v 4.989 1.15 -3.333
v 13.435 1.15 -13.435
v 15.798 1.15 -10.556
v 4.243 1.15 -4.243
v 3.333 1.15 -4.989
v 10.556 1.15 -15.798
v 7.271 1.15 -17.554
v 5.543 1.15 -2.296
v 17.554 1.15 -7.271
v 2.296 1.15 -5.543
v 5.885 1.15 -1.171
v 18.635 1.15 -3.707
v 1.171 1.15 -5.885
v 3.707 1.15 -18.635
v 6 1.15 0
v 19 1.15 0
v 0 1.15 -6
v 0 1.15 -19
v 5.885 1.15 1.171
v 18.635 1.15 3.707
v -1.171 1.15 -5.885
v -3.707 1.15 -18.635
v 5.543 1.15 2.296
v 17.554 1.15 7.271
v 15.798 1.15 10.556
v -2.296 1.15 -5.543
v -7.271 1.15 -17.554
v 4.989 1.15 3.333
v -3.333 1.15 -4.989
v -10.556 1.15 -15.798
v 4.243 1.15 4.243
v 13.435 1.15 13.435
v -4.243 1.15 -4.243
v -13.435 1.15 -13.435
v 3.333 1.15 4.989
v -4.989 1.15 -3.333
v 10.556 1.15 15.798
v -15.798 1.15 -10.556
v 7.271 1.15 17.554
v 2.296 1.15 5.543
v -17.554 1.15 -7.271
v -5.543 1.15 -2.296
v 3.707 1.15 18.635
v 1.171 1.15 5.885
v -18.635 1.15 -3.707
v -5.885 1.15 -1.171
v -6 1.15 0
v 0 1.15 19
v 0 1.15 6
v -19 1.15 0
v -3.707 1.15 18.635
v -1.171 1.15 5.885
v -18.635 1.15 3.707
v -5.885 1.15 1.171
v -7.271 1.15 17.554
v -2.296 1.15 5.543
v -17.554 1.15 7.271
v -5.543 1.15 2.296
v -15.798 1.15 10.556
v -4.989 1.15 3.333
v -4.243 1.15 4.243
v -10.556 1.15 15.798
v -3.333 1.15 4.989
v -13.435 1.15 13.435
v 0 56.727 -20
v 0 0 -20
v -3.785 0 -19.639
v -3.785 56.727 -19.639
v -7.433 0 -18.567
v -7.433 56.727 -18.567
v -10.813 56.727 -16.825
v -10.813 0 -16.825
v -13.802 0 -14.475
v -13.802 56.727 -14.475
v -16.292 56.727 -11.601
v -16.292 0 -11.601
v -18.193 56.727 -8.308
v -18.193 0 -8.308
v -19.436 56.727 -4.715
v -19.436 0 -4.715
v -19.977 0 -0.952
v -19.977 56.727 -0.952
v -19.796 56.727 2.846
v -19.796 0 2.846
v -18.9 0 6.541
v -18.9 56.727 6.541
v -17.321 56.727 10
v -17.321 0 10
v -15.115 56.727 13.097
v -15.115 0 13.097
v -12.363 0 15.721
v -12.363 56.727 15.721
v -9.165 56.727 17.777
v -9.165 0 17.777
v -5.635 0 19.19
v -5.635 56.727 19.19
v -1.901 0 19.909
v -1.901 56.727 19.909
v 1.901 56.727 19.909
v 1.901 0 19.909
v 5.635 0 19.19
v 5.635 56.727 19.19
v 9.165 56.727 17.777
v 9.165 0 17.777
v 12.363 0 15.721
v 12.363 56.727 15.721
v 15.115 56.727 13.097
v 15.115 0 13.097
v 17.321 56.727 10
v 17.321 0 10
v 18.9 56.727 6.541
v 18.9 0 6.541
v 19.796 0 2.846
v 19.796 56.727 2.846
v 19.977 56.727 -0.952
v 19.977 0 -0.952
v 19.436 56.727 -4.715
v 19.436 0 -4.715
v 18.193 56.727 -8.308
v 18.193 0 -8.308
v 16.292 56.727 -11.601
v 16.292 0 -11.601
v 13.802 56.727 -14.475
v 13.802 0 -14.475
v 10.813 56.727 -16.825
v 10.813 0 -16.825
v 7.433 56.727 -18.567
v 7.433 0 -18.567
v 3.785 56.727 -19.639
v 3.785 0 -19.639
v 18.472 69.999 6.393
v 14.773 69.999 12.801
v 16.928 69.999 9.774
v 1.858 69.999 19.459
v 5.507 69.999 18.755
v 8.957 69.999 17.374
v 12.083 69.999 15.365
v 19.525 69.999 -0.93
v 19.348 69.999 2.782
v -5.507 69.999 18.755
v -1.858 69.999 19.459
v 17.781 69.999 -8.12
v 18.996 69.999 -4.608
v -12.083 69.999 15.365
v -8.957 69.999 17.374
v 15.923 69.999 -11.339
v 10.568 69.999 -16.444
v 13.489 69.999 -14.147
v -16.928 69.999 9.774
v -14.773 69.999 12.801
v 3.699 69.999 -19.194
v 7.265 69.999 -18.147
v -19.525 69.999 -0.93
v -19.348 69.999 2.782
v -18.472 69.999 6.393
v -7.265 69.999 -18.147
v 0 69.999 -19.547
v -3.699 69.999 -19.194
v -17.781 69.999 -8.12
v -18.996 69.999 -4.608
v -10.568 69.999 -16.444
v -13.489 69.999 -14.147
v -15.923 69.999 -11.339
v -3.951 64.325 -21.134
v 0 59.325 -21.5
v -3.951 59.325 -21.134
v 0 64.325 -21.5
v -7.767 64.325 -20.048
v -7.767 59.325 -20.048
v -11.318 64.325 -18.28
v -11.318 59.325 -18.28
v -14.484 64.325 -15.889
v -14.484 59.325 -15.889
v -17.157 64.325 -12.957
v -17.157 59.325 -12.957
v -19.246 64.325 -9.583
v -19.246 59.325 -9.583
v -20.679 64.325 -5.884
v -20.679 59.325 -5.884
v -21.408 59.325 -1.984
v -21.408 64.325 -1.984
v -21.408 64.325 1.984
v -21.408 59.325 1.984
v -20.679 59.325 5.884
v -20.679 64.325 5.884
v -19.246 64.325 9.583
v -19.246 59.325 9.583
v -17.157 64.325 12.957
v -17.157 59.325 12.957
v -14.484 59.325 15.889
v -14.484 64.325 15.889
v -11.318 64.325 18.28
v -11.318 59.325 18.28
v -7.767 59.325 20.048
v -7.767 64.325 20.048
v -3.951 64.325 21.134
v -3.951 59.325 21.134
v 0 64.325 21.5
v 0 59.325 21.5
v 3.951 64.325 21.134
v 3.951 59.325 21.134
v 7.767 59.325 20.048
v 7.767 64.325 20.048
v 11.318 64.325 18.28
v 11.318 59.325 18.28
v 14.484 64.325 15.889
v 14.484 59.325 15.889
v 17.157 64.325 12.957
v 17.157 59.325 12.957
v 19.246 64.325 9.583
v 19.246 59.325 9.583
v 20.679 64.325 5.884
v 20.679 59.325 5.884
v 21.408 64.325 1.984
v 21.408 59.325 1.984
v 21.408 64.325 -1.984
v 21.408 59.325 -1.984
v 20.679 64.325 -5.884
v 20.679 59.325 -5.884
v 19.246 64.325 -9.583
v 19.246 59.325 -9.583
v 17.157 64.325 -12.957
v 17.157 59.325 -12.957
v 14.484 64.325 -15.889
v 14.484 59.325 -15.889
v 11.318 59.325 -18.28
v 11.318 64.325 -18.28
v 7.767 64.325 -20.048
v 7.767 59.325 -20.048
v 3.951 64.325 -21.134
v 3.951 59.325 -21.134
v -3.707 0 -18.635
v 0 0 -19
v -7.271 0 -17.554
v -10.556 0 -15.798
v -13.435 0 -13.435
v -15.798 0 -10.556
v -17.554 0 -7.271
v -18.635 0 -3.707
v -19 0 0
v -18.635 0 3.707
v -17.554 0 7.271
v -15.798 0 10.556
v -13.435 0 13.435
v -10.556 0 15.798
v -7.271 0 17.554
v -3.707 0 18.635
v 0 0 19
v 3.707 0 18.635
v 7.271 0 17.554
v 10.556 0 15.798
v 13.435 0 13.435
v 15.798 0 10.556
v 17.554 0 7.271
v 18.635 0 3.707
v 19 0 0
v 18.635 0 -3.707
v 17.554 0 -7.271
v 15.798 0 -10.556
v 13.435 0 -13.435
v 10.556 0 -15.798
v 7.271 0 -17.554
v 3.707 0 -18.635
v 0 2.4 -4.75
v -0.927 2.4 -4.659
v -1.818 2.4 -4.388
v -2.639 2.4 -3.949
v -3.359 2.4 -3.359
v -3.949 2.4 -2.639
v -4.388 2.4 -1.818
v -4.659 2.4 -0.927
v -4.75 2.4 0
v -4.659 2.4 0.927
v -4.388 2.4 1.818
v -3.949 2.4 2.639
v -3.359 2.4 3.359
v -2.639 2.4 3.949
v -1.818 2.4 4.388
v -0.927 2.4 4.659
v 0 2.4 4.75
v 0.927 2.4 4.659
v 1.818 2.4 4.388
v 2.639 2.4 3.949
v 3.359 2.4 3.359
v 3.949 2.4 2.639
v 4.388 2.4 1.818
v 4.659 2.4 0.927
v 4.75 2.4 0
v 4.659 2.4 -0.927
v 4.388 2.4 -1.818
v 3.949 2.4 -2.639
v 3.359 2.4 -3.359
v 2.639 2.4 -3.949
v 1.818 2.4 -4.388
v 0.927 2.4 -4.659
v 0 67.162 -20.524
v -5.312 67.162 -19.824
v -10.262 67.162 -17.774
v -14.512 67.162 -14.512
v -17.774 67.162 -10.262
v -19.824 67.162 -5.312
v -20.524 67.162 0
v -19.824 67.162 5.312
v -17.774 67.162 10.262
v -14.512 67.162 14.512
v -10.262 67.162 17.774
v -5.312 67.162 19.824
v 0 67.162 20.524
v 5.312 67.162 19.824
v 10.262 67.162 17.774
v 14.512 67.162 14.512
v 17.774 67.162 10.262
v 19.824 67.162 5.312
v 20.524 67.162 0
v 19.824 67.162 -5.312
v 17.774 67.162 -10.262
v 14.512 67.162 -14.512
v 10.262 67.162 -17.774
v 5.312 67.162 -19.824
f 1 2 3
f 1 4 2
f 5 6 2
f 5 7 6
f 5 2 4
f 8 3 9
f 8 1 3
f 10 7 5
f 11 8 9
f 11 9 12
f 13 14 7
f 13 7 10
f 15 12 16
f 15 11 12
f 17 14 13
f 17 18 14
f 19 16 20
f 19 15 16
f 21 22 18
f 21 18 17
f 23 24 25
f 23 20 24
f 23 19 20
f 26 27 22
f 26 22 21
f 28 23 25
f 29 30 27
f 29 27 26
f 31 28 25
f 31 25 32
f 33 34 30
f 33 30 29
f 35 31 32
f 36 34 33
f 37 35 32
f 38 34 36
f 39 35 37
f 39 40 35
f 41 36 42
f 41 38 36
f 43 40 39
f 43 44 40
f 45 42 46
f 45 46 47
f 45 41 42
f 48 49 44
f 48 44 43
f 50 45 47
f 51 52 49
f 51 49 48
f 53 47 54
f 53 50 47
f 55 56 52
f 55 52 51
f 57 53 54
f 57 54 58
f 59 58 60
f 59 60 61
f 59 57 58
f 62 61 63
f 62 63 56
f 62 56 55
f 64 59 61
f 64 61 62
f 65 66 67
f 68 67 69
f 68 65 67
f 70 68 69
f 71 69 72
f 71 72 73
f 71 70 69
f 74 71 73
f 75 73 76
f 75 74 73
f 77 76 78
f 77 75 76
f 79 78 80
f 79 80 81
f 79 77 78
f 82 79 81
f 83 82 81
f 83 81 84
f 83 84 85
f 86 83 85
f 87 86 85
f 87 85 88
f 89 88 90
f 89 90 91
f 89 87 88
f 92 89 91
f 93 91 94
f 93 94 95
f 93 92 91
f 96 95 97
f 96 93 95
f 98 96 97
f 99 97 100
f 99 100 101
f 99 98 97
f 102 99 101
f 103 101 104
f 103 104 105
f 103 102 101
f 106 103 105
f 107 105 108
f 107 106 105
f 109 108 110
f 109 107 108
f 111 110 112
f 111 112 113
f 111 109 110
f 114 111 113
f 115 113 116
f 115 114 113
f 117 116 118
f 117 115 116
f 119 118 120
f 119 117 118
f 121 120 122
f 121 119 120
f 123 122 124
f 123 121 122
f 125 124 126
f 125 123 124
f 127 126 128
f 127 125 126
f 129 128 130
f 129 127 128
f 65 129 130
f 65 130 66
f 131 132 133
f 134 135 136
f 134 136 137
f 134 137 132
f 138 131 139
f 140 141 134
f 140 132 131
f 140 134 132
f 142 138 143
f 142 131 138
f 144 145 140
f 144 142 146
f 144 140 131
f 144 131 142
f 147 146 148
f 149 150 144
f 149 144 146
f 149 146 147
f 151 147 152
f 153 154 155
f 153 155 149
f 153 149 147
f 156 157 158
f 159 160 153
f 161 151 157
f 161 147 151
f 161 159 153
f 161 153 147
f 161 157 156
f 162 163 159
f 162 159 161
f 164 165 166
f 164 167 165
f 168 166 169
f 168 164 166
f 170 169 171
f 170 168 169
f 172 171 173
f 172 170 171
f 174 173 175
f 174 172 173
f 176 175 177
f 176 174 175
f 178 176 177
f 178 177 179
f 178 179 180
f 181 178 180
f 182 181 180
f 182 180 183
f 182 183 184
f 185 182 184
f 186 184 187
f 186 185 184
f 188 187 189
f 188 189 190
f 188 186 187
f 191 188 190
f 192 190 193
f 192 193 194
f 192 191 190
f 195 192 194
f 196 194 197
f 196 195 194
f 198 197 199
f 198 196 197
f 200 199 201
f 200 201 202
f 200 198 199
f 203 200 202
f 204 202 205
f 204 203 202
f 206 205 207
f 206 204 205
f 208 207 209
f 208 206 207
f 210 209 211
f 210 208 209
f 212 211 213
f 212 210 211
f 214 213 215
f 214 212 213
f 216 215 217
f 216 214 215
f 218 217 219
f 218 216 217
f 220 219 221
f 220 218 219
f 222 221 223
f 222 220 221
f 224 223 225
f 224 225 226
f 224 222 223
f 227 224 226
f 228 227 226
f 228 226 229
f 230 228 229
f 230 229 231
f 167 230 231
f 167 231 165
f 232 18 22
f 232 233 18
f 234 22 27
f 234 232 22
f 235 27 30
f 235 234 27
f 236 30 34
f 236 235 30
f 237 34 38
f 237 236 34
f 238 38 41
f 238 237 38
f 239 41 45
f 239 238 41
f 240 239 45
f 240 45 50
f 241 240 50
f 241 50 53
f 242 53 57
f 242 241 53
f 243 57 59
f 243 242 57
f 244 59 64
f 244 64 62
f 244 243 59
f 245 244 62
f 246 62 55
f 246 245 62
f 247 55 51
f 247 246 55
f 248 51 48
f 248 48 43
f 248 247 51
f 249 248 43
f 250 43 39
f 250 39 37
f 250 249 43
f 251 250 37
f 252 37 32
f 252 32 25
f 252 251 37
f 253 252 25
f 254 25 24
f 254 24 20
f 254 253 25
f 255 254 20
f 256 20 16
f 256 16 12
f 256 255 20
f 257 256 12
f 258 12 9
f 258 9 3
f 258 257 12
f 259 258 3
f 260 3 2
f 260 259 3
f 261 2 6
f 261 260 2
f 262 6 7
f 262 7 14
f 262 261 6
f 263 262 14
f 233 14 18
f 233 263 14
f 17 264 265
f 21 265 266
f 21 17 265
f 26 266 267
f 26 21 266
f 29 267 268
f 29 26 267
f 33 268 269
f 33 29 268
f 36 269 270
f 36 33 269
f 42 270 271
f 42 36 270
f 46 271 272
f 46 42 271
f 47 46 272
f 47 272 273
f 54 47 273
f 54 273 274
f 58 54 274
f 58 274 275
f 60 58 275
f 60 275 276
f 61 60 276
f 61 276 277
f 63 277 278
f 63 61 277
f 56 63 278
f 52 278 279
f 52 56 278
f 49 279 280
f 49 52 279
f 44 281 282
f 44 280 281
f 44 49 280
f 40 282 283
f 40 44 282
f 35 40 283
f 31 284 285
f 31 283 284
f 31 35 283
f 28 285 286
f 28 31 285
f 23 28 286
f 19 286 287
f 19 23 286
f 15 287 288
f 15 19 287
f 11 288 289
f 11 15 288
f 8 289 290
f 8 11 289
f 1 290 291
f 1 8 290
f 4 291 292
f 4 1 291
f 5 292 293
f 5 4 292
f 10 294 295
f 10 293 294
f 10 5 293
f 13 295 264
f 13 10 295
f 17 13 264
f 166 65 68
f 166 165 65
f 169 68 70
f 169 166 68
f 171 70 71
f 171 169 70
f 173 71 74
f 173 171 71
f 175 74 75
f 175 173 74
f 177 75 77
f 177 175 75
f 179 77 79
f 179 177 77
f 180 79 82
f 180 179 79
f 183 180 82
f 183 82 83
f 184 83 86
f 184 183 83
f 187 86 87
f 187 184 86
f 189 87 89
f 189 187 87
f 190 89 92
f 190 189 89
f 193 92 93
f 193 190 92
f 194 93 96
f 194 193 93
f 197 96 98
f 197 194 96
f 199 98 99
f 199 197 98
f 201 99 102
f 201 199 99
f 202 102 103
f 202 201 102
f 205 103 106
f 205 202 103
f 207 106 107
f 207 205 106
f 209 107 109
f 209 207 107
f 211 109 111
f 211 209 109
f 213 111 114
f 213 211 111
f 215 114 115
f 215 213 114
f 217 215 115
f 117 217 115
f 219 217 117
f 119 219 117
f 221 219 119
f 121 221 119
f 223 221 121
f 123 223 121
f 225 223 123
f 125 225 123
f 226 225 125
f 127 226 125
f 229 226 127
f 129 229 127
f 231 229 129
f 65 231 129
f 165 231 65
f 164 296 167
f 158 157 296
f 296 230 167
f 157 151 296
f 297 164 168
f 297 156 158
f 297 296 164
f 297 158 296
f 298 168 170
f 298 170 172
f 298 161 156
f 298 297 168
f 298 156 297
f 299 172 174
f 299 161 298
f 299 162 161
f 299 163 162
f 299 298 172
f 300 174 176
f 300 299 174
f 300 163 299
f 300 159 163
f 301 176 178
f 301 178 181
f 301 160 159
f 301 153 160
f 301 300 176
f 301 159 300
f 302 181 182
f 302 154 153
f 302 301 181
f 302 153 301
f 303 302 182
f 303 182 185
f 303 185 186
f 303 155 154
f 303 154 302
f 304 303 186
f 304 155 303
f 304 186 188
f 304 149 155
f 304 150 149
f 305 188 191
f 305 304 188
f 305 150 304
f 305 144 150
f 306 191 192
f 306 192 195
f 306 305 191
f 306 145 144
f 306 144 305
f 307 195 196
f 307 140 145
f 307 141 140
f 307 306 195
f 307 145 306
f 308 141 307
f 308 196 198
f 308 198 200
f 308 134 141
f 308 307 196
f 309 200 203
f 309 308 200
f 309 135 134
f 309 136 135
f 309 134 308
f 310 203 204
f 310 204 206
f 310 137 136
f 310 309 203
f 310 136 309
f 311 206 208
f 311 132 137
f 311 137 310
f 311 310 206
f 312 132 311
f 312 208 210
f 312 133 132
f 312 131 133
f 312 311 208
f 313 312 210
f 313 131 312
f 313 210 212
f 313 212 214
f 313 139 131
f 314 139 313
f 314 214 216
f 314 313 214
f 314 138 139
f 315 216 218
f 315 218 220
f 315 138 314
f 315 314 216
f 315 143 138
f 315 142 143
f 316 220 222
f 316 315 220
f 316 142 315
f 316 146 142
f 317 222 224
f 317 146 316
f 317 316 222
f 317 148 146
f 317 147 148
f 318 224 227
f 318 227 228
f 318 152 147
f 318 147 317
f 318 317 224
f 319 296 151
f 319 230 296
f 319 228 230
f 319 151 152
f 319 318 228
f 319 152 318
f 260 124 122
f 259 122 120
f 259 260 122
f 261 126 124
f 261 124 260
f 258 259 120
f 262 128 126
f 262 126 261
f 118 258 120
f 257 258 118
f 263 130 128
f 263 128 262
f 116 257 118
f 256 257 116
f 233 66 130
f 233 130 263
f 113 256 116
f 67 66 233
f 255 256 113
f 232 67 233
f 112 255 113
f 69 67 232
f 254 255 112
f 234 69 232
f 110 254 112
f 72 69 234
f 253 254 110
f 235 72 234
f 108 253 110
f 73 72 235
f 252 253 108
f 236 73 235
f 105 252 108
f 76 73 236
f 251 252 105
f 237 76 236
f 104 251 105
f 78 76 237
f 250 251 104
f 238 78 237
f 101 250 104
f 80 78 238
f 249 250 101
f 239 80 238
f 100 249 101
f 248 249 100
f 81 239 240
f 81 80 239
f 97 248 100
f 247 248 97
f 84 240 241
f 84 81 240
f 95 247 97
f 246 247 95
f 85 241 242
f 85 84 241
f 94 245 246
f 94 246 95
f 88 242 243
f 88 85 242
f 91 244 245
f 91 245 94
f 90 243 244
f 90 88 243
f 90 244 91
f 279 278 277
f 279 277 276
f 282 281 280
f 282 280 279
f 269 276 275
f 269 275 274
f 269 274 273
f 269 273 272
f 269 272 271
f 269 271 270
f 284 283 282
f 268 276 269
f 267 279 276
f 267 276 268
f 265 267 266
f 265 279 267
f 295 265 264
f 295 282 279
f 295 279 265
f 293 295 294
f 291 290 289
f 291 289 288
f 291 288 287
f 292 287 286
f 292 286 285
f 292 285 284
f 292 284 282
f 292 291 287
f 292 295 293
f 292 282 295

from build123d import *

# Parameters (mm, degrees)
FILLET1_SIZE = 1.5


with BuildPart() as part:
    # Sketch1 → Revolve1 (revolve)
    with BuildSketch(Plane.XY, mode=Mode.PRIVATE) as revolve1_sk:
        Polygon((20, 0), (20, 56.727116956), (21.5, 59.325193167), (21.5, 64.325193167), (19.547262907, 69.998535907), (0, 69.998535907), (0, 2.4), (4.5, 2.4), (4.5, 1.15), (19, 1.15), (19, 0), align=None)
    revolve(revolve1_sk.sketch.rotate(Axis((0, 2.4, 0), (0, 1, 0)), 90), axis=Axis((0, 2.4, 0), (0, 1, 0)))

    # Fillet1
    # the kernel refuses this chamfer: 1.5 mm, written as the material it takes off along each edge
    with BuildSketch(Plane(origin=(0, 1.15, 0), x_dir=(0, 0, -1), z_dir=(1, 0, 0))) as fillet1_piece_1_section:
        Polygon((4.5, FILLET1_SIZE), (4.5 + FILLET1_SIZE, 0), (4.5, 0), align=None)
    fillet1_piece_1 = revolve(axis=Axis((0, 1.15, 0), (0, 1, 0)), mode=Mode.PRIVATE)
    fillet1_piece_1 = split(fillet1_piece_1, bisect_by=Plane(origin=(0, 2.4, 5.37255081), z_dir=(0, -1, 0)), keep=Keep.TOP, mode=Mode.PRIVATE)
    add(fillet1_piece_1, mode=Mode.SUBTRACT)


solid = part.part
